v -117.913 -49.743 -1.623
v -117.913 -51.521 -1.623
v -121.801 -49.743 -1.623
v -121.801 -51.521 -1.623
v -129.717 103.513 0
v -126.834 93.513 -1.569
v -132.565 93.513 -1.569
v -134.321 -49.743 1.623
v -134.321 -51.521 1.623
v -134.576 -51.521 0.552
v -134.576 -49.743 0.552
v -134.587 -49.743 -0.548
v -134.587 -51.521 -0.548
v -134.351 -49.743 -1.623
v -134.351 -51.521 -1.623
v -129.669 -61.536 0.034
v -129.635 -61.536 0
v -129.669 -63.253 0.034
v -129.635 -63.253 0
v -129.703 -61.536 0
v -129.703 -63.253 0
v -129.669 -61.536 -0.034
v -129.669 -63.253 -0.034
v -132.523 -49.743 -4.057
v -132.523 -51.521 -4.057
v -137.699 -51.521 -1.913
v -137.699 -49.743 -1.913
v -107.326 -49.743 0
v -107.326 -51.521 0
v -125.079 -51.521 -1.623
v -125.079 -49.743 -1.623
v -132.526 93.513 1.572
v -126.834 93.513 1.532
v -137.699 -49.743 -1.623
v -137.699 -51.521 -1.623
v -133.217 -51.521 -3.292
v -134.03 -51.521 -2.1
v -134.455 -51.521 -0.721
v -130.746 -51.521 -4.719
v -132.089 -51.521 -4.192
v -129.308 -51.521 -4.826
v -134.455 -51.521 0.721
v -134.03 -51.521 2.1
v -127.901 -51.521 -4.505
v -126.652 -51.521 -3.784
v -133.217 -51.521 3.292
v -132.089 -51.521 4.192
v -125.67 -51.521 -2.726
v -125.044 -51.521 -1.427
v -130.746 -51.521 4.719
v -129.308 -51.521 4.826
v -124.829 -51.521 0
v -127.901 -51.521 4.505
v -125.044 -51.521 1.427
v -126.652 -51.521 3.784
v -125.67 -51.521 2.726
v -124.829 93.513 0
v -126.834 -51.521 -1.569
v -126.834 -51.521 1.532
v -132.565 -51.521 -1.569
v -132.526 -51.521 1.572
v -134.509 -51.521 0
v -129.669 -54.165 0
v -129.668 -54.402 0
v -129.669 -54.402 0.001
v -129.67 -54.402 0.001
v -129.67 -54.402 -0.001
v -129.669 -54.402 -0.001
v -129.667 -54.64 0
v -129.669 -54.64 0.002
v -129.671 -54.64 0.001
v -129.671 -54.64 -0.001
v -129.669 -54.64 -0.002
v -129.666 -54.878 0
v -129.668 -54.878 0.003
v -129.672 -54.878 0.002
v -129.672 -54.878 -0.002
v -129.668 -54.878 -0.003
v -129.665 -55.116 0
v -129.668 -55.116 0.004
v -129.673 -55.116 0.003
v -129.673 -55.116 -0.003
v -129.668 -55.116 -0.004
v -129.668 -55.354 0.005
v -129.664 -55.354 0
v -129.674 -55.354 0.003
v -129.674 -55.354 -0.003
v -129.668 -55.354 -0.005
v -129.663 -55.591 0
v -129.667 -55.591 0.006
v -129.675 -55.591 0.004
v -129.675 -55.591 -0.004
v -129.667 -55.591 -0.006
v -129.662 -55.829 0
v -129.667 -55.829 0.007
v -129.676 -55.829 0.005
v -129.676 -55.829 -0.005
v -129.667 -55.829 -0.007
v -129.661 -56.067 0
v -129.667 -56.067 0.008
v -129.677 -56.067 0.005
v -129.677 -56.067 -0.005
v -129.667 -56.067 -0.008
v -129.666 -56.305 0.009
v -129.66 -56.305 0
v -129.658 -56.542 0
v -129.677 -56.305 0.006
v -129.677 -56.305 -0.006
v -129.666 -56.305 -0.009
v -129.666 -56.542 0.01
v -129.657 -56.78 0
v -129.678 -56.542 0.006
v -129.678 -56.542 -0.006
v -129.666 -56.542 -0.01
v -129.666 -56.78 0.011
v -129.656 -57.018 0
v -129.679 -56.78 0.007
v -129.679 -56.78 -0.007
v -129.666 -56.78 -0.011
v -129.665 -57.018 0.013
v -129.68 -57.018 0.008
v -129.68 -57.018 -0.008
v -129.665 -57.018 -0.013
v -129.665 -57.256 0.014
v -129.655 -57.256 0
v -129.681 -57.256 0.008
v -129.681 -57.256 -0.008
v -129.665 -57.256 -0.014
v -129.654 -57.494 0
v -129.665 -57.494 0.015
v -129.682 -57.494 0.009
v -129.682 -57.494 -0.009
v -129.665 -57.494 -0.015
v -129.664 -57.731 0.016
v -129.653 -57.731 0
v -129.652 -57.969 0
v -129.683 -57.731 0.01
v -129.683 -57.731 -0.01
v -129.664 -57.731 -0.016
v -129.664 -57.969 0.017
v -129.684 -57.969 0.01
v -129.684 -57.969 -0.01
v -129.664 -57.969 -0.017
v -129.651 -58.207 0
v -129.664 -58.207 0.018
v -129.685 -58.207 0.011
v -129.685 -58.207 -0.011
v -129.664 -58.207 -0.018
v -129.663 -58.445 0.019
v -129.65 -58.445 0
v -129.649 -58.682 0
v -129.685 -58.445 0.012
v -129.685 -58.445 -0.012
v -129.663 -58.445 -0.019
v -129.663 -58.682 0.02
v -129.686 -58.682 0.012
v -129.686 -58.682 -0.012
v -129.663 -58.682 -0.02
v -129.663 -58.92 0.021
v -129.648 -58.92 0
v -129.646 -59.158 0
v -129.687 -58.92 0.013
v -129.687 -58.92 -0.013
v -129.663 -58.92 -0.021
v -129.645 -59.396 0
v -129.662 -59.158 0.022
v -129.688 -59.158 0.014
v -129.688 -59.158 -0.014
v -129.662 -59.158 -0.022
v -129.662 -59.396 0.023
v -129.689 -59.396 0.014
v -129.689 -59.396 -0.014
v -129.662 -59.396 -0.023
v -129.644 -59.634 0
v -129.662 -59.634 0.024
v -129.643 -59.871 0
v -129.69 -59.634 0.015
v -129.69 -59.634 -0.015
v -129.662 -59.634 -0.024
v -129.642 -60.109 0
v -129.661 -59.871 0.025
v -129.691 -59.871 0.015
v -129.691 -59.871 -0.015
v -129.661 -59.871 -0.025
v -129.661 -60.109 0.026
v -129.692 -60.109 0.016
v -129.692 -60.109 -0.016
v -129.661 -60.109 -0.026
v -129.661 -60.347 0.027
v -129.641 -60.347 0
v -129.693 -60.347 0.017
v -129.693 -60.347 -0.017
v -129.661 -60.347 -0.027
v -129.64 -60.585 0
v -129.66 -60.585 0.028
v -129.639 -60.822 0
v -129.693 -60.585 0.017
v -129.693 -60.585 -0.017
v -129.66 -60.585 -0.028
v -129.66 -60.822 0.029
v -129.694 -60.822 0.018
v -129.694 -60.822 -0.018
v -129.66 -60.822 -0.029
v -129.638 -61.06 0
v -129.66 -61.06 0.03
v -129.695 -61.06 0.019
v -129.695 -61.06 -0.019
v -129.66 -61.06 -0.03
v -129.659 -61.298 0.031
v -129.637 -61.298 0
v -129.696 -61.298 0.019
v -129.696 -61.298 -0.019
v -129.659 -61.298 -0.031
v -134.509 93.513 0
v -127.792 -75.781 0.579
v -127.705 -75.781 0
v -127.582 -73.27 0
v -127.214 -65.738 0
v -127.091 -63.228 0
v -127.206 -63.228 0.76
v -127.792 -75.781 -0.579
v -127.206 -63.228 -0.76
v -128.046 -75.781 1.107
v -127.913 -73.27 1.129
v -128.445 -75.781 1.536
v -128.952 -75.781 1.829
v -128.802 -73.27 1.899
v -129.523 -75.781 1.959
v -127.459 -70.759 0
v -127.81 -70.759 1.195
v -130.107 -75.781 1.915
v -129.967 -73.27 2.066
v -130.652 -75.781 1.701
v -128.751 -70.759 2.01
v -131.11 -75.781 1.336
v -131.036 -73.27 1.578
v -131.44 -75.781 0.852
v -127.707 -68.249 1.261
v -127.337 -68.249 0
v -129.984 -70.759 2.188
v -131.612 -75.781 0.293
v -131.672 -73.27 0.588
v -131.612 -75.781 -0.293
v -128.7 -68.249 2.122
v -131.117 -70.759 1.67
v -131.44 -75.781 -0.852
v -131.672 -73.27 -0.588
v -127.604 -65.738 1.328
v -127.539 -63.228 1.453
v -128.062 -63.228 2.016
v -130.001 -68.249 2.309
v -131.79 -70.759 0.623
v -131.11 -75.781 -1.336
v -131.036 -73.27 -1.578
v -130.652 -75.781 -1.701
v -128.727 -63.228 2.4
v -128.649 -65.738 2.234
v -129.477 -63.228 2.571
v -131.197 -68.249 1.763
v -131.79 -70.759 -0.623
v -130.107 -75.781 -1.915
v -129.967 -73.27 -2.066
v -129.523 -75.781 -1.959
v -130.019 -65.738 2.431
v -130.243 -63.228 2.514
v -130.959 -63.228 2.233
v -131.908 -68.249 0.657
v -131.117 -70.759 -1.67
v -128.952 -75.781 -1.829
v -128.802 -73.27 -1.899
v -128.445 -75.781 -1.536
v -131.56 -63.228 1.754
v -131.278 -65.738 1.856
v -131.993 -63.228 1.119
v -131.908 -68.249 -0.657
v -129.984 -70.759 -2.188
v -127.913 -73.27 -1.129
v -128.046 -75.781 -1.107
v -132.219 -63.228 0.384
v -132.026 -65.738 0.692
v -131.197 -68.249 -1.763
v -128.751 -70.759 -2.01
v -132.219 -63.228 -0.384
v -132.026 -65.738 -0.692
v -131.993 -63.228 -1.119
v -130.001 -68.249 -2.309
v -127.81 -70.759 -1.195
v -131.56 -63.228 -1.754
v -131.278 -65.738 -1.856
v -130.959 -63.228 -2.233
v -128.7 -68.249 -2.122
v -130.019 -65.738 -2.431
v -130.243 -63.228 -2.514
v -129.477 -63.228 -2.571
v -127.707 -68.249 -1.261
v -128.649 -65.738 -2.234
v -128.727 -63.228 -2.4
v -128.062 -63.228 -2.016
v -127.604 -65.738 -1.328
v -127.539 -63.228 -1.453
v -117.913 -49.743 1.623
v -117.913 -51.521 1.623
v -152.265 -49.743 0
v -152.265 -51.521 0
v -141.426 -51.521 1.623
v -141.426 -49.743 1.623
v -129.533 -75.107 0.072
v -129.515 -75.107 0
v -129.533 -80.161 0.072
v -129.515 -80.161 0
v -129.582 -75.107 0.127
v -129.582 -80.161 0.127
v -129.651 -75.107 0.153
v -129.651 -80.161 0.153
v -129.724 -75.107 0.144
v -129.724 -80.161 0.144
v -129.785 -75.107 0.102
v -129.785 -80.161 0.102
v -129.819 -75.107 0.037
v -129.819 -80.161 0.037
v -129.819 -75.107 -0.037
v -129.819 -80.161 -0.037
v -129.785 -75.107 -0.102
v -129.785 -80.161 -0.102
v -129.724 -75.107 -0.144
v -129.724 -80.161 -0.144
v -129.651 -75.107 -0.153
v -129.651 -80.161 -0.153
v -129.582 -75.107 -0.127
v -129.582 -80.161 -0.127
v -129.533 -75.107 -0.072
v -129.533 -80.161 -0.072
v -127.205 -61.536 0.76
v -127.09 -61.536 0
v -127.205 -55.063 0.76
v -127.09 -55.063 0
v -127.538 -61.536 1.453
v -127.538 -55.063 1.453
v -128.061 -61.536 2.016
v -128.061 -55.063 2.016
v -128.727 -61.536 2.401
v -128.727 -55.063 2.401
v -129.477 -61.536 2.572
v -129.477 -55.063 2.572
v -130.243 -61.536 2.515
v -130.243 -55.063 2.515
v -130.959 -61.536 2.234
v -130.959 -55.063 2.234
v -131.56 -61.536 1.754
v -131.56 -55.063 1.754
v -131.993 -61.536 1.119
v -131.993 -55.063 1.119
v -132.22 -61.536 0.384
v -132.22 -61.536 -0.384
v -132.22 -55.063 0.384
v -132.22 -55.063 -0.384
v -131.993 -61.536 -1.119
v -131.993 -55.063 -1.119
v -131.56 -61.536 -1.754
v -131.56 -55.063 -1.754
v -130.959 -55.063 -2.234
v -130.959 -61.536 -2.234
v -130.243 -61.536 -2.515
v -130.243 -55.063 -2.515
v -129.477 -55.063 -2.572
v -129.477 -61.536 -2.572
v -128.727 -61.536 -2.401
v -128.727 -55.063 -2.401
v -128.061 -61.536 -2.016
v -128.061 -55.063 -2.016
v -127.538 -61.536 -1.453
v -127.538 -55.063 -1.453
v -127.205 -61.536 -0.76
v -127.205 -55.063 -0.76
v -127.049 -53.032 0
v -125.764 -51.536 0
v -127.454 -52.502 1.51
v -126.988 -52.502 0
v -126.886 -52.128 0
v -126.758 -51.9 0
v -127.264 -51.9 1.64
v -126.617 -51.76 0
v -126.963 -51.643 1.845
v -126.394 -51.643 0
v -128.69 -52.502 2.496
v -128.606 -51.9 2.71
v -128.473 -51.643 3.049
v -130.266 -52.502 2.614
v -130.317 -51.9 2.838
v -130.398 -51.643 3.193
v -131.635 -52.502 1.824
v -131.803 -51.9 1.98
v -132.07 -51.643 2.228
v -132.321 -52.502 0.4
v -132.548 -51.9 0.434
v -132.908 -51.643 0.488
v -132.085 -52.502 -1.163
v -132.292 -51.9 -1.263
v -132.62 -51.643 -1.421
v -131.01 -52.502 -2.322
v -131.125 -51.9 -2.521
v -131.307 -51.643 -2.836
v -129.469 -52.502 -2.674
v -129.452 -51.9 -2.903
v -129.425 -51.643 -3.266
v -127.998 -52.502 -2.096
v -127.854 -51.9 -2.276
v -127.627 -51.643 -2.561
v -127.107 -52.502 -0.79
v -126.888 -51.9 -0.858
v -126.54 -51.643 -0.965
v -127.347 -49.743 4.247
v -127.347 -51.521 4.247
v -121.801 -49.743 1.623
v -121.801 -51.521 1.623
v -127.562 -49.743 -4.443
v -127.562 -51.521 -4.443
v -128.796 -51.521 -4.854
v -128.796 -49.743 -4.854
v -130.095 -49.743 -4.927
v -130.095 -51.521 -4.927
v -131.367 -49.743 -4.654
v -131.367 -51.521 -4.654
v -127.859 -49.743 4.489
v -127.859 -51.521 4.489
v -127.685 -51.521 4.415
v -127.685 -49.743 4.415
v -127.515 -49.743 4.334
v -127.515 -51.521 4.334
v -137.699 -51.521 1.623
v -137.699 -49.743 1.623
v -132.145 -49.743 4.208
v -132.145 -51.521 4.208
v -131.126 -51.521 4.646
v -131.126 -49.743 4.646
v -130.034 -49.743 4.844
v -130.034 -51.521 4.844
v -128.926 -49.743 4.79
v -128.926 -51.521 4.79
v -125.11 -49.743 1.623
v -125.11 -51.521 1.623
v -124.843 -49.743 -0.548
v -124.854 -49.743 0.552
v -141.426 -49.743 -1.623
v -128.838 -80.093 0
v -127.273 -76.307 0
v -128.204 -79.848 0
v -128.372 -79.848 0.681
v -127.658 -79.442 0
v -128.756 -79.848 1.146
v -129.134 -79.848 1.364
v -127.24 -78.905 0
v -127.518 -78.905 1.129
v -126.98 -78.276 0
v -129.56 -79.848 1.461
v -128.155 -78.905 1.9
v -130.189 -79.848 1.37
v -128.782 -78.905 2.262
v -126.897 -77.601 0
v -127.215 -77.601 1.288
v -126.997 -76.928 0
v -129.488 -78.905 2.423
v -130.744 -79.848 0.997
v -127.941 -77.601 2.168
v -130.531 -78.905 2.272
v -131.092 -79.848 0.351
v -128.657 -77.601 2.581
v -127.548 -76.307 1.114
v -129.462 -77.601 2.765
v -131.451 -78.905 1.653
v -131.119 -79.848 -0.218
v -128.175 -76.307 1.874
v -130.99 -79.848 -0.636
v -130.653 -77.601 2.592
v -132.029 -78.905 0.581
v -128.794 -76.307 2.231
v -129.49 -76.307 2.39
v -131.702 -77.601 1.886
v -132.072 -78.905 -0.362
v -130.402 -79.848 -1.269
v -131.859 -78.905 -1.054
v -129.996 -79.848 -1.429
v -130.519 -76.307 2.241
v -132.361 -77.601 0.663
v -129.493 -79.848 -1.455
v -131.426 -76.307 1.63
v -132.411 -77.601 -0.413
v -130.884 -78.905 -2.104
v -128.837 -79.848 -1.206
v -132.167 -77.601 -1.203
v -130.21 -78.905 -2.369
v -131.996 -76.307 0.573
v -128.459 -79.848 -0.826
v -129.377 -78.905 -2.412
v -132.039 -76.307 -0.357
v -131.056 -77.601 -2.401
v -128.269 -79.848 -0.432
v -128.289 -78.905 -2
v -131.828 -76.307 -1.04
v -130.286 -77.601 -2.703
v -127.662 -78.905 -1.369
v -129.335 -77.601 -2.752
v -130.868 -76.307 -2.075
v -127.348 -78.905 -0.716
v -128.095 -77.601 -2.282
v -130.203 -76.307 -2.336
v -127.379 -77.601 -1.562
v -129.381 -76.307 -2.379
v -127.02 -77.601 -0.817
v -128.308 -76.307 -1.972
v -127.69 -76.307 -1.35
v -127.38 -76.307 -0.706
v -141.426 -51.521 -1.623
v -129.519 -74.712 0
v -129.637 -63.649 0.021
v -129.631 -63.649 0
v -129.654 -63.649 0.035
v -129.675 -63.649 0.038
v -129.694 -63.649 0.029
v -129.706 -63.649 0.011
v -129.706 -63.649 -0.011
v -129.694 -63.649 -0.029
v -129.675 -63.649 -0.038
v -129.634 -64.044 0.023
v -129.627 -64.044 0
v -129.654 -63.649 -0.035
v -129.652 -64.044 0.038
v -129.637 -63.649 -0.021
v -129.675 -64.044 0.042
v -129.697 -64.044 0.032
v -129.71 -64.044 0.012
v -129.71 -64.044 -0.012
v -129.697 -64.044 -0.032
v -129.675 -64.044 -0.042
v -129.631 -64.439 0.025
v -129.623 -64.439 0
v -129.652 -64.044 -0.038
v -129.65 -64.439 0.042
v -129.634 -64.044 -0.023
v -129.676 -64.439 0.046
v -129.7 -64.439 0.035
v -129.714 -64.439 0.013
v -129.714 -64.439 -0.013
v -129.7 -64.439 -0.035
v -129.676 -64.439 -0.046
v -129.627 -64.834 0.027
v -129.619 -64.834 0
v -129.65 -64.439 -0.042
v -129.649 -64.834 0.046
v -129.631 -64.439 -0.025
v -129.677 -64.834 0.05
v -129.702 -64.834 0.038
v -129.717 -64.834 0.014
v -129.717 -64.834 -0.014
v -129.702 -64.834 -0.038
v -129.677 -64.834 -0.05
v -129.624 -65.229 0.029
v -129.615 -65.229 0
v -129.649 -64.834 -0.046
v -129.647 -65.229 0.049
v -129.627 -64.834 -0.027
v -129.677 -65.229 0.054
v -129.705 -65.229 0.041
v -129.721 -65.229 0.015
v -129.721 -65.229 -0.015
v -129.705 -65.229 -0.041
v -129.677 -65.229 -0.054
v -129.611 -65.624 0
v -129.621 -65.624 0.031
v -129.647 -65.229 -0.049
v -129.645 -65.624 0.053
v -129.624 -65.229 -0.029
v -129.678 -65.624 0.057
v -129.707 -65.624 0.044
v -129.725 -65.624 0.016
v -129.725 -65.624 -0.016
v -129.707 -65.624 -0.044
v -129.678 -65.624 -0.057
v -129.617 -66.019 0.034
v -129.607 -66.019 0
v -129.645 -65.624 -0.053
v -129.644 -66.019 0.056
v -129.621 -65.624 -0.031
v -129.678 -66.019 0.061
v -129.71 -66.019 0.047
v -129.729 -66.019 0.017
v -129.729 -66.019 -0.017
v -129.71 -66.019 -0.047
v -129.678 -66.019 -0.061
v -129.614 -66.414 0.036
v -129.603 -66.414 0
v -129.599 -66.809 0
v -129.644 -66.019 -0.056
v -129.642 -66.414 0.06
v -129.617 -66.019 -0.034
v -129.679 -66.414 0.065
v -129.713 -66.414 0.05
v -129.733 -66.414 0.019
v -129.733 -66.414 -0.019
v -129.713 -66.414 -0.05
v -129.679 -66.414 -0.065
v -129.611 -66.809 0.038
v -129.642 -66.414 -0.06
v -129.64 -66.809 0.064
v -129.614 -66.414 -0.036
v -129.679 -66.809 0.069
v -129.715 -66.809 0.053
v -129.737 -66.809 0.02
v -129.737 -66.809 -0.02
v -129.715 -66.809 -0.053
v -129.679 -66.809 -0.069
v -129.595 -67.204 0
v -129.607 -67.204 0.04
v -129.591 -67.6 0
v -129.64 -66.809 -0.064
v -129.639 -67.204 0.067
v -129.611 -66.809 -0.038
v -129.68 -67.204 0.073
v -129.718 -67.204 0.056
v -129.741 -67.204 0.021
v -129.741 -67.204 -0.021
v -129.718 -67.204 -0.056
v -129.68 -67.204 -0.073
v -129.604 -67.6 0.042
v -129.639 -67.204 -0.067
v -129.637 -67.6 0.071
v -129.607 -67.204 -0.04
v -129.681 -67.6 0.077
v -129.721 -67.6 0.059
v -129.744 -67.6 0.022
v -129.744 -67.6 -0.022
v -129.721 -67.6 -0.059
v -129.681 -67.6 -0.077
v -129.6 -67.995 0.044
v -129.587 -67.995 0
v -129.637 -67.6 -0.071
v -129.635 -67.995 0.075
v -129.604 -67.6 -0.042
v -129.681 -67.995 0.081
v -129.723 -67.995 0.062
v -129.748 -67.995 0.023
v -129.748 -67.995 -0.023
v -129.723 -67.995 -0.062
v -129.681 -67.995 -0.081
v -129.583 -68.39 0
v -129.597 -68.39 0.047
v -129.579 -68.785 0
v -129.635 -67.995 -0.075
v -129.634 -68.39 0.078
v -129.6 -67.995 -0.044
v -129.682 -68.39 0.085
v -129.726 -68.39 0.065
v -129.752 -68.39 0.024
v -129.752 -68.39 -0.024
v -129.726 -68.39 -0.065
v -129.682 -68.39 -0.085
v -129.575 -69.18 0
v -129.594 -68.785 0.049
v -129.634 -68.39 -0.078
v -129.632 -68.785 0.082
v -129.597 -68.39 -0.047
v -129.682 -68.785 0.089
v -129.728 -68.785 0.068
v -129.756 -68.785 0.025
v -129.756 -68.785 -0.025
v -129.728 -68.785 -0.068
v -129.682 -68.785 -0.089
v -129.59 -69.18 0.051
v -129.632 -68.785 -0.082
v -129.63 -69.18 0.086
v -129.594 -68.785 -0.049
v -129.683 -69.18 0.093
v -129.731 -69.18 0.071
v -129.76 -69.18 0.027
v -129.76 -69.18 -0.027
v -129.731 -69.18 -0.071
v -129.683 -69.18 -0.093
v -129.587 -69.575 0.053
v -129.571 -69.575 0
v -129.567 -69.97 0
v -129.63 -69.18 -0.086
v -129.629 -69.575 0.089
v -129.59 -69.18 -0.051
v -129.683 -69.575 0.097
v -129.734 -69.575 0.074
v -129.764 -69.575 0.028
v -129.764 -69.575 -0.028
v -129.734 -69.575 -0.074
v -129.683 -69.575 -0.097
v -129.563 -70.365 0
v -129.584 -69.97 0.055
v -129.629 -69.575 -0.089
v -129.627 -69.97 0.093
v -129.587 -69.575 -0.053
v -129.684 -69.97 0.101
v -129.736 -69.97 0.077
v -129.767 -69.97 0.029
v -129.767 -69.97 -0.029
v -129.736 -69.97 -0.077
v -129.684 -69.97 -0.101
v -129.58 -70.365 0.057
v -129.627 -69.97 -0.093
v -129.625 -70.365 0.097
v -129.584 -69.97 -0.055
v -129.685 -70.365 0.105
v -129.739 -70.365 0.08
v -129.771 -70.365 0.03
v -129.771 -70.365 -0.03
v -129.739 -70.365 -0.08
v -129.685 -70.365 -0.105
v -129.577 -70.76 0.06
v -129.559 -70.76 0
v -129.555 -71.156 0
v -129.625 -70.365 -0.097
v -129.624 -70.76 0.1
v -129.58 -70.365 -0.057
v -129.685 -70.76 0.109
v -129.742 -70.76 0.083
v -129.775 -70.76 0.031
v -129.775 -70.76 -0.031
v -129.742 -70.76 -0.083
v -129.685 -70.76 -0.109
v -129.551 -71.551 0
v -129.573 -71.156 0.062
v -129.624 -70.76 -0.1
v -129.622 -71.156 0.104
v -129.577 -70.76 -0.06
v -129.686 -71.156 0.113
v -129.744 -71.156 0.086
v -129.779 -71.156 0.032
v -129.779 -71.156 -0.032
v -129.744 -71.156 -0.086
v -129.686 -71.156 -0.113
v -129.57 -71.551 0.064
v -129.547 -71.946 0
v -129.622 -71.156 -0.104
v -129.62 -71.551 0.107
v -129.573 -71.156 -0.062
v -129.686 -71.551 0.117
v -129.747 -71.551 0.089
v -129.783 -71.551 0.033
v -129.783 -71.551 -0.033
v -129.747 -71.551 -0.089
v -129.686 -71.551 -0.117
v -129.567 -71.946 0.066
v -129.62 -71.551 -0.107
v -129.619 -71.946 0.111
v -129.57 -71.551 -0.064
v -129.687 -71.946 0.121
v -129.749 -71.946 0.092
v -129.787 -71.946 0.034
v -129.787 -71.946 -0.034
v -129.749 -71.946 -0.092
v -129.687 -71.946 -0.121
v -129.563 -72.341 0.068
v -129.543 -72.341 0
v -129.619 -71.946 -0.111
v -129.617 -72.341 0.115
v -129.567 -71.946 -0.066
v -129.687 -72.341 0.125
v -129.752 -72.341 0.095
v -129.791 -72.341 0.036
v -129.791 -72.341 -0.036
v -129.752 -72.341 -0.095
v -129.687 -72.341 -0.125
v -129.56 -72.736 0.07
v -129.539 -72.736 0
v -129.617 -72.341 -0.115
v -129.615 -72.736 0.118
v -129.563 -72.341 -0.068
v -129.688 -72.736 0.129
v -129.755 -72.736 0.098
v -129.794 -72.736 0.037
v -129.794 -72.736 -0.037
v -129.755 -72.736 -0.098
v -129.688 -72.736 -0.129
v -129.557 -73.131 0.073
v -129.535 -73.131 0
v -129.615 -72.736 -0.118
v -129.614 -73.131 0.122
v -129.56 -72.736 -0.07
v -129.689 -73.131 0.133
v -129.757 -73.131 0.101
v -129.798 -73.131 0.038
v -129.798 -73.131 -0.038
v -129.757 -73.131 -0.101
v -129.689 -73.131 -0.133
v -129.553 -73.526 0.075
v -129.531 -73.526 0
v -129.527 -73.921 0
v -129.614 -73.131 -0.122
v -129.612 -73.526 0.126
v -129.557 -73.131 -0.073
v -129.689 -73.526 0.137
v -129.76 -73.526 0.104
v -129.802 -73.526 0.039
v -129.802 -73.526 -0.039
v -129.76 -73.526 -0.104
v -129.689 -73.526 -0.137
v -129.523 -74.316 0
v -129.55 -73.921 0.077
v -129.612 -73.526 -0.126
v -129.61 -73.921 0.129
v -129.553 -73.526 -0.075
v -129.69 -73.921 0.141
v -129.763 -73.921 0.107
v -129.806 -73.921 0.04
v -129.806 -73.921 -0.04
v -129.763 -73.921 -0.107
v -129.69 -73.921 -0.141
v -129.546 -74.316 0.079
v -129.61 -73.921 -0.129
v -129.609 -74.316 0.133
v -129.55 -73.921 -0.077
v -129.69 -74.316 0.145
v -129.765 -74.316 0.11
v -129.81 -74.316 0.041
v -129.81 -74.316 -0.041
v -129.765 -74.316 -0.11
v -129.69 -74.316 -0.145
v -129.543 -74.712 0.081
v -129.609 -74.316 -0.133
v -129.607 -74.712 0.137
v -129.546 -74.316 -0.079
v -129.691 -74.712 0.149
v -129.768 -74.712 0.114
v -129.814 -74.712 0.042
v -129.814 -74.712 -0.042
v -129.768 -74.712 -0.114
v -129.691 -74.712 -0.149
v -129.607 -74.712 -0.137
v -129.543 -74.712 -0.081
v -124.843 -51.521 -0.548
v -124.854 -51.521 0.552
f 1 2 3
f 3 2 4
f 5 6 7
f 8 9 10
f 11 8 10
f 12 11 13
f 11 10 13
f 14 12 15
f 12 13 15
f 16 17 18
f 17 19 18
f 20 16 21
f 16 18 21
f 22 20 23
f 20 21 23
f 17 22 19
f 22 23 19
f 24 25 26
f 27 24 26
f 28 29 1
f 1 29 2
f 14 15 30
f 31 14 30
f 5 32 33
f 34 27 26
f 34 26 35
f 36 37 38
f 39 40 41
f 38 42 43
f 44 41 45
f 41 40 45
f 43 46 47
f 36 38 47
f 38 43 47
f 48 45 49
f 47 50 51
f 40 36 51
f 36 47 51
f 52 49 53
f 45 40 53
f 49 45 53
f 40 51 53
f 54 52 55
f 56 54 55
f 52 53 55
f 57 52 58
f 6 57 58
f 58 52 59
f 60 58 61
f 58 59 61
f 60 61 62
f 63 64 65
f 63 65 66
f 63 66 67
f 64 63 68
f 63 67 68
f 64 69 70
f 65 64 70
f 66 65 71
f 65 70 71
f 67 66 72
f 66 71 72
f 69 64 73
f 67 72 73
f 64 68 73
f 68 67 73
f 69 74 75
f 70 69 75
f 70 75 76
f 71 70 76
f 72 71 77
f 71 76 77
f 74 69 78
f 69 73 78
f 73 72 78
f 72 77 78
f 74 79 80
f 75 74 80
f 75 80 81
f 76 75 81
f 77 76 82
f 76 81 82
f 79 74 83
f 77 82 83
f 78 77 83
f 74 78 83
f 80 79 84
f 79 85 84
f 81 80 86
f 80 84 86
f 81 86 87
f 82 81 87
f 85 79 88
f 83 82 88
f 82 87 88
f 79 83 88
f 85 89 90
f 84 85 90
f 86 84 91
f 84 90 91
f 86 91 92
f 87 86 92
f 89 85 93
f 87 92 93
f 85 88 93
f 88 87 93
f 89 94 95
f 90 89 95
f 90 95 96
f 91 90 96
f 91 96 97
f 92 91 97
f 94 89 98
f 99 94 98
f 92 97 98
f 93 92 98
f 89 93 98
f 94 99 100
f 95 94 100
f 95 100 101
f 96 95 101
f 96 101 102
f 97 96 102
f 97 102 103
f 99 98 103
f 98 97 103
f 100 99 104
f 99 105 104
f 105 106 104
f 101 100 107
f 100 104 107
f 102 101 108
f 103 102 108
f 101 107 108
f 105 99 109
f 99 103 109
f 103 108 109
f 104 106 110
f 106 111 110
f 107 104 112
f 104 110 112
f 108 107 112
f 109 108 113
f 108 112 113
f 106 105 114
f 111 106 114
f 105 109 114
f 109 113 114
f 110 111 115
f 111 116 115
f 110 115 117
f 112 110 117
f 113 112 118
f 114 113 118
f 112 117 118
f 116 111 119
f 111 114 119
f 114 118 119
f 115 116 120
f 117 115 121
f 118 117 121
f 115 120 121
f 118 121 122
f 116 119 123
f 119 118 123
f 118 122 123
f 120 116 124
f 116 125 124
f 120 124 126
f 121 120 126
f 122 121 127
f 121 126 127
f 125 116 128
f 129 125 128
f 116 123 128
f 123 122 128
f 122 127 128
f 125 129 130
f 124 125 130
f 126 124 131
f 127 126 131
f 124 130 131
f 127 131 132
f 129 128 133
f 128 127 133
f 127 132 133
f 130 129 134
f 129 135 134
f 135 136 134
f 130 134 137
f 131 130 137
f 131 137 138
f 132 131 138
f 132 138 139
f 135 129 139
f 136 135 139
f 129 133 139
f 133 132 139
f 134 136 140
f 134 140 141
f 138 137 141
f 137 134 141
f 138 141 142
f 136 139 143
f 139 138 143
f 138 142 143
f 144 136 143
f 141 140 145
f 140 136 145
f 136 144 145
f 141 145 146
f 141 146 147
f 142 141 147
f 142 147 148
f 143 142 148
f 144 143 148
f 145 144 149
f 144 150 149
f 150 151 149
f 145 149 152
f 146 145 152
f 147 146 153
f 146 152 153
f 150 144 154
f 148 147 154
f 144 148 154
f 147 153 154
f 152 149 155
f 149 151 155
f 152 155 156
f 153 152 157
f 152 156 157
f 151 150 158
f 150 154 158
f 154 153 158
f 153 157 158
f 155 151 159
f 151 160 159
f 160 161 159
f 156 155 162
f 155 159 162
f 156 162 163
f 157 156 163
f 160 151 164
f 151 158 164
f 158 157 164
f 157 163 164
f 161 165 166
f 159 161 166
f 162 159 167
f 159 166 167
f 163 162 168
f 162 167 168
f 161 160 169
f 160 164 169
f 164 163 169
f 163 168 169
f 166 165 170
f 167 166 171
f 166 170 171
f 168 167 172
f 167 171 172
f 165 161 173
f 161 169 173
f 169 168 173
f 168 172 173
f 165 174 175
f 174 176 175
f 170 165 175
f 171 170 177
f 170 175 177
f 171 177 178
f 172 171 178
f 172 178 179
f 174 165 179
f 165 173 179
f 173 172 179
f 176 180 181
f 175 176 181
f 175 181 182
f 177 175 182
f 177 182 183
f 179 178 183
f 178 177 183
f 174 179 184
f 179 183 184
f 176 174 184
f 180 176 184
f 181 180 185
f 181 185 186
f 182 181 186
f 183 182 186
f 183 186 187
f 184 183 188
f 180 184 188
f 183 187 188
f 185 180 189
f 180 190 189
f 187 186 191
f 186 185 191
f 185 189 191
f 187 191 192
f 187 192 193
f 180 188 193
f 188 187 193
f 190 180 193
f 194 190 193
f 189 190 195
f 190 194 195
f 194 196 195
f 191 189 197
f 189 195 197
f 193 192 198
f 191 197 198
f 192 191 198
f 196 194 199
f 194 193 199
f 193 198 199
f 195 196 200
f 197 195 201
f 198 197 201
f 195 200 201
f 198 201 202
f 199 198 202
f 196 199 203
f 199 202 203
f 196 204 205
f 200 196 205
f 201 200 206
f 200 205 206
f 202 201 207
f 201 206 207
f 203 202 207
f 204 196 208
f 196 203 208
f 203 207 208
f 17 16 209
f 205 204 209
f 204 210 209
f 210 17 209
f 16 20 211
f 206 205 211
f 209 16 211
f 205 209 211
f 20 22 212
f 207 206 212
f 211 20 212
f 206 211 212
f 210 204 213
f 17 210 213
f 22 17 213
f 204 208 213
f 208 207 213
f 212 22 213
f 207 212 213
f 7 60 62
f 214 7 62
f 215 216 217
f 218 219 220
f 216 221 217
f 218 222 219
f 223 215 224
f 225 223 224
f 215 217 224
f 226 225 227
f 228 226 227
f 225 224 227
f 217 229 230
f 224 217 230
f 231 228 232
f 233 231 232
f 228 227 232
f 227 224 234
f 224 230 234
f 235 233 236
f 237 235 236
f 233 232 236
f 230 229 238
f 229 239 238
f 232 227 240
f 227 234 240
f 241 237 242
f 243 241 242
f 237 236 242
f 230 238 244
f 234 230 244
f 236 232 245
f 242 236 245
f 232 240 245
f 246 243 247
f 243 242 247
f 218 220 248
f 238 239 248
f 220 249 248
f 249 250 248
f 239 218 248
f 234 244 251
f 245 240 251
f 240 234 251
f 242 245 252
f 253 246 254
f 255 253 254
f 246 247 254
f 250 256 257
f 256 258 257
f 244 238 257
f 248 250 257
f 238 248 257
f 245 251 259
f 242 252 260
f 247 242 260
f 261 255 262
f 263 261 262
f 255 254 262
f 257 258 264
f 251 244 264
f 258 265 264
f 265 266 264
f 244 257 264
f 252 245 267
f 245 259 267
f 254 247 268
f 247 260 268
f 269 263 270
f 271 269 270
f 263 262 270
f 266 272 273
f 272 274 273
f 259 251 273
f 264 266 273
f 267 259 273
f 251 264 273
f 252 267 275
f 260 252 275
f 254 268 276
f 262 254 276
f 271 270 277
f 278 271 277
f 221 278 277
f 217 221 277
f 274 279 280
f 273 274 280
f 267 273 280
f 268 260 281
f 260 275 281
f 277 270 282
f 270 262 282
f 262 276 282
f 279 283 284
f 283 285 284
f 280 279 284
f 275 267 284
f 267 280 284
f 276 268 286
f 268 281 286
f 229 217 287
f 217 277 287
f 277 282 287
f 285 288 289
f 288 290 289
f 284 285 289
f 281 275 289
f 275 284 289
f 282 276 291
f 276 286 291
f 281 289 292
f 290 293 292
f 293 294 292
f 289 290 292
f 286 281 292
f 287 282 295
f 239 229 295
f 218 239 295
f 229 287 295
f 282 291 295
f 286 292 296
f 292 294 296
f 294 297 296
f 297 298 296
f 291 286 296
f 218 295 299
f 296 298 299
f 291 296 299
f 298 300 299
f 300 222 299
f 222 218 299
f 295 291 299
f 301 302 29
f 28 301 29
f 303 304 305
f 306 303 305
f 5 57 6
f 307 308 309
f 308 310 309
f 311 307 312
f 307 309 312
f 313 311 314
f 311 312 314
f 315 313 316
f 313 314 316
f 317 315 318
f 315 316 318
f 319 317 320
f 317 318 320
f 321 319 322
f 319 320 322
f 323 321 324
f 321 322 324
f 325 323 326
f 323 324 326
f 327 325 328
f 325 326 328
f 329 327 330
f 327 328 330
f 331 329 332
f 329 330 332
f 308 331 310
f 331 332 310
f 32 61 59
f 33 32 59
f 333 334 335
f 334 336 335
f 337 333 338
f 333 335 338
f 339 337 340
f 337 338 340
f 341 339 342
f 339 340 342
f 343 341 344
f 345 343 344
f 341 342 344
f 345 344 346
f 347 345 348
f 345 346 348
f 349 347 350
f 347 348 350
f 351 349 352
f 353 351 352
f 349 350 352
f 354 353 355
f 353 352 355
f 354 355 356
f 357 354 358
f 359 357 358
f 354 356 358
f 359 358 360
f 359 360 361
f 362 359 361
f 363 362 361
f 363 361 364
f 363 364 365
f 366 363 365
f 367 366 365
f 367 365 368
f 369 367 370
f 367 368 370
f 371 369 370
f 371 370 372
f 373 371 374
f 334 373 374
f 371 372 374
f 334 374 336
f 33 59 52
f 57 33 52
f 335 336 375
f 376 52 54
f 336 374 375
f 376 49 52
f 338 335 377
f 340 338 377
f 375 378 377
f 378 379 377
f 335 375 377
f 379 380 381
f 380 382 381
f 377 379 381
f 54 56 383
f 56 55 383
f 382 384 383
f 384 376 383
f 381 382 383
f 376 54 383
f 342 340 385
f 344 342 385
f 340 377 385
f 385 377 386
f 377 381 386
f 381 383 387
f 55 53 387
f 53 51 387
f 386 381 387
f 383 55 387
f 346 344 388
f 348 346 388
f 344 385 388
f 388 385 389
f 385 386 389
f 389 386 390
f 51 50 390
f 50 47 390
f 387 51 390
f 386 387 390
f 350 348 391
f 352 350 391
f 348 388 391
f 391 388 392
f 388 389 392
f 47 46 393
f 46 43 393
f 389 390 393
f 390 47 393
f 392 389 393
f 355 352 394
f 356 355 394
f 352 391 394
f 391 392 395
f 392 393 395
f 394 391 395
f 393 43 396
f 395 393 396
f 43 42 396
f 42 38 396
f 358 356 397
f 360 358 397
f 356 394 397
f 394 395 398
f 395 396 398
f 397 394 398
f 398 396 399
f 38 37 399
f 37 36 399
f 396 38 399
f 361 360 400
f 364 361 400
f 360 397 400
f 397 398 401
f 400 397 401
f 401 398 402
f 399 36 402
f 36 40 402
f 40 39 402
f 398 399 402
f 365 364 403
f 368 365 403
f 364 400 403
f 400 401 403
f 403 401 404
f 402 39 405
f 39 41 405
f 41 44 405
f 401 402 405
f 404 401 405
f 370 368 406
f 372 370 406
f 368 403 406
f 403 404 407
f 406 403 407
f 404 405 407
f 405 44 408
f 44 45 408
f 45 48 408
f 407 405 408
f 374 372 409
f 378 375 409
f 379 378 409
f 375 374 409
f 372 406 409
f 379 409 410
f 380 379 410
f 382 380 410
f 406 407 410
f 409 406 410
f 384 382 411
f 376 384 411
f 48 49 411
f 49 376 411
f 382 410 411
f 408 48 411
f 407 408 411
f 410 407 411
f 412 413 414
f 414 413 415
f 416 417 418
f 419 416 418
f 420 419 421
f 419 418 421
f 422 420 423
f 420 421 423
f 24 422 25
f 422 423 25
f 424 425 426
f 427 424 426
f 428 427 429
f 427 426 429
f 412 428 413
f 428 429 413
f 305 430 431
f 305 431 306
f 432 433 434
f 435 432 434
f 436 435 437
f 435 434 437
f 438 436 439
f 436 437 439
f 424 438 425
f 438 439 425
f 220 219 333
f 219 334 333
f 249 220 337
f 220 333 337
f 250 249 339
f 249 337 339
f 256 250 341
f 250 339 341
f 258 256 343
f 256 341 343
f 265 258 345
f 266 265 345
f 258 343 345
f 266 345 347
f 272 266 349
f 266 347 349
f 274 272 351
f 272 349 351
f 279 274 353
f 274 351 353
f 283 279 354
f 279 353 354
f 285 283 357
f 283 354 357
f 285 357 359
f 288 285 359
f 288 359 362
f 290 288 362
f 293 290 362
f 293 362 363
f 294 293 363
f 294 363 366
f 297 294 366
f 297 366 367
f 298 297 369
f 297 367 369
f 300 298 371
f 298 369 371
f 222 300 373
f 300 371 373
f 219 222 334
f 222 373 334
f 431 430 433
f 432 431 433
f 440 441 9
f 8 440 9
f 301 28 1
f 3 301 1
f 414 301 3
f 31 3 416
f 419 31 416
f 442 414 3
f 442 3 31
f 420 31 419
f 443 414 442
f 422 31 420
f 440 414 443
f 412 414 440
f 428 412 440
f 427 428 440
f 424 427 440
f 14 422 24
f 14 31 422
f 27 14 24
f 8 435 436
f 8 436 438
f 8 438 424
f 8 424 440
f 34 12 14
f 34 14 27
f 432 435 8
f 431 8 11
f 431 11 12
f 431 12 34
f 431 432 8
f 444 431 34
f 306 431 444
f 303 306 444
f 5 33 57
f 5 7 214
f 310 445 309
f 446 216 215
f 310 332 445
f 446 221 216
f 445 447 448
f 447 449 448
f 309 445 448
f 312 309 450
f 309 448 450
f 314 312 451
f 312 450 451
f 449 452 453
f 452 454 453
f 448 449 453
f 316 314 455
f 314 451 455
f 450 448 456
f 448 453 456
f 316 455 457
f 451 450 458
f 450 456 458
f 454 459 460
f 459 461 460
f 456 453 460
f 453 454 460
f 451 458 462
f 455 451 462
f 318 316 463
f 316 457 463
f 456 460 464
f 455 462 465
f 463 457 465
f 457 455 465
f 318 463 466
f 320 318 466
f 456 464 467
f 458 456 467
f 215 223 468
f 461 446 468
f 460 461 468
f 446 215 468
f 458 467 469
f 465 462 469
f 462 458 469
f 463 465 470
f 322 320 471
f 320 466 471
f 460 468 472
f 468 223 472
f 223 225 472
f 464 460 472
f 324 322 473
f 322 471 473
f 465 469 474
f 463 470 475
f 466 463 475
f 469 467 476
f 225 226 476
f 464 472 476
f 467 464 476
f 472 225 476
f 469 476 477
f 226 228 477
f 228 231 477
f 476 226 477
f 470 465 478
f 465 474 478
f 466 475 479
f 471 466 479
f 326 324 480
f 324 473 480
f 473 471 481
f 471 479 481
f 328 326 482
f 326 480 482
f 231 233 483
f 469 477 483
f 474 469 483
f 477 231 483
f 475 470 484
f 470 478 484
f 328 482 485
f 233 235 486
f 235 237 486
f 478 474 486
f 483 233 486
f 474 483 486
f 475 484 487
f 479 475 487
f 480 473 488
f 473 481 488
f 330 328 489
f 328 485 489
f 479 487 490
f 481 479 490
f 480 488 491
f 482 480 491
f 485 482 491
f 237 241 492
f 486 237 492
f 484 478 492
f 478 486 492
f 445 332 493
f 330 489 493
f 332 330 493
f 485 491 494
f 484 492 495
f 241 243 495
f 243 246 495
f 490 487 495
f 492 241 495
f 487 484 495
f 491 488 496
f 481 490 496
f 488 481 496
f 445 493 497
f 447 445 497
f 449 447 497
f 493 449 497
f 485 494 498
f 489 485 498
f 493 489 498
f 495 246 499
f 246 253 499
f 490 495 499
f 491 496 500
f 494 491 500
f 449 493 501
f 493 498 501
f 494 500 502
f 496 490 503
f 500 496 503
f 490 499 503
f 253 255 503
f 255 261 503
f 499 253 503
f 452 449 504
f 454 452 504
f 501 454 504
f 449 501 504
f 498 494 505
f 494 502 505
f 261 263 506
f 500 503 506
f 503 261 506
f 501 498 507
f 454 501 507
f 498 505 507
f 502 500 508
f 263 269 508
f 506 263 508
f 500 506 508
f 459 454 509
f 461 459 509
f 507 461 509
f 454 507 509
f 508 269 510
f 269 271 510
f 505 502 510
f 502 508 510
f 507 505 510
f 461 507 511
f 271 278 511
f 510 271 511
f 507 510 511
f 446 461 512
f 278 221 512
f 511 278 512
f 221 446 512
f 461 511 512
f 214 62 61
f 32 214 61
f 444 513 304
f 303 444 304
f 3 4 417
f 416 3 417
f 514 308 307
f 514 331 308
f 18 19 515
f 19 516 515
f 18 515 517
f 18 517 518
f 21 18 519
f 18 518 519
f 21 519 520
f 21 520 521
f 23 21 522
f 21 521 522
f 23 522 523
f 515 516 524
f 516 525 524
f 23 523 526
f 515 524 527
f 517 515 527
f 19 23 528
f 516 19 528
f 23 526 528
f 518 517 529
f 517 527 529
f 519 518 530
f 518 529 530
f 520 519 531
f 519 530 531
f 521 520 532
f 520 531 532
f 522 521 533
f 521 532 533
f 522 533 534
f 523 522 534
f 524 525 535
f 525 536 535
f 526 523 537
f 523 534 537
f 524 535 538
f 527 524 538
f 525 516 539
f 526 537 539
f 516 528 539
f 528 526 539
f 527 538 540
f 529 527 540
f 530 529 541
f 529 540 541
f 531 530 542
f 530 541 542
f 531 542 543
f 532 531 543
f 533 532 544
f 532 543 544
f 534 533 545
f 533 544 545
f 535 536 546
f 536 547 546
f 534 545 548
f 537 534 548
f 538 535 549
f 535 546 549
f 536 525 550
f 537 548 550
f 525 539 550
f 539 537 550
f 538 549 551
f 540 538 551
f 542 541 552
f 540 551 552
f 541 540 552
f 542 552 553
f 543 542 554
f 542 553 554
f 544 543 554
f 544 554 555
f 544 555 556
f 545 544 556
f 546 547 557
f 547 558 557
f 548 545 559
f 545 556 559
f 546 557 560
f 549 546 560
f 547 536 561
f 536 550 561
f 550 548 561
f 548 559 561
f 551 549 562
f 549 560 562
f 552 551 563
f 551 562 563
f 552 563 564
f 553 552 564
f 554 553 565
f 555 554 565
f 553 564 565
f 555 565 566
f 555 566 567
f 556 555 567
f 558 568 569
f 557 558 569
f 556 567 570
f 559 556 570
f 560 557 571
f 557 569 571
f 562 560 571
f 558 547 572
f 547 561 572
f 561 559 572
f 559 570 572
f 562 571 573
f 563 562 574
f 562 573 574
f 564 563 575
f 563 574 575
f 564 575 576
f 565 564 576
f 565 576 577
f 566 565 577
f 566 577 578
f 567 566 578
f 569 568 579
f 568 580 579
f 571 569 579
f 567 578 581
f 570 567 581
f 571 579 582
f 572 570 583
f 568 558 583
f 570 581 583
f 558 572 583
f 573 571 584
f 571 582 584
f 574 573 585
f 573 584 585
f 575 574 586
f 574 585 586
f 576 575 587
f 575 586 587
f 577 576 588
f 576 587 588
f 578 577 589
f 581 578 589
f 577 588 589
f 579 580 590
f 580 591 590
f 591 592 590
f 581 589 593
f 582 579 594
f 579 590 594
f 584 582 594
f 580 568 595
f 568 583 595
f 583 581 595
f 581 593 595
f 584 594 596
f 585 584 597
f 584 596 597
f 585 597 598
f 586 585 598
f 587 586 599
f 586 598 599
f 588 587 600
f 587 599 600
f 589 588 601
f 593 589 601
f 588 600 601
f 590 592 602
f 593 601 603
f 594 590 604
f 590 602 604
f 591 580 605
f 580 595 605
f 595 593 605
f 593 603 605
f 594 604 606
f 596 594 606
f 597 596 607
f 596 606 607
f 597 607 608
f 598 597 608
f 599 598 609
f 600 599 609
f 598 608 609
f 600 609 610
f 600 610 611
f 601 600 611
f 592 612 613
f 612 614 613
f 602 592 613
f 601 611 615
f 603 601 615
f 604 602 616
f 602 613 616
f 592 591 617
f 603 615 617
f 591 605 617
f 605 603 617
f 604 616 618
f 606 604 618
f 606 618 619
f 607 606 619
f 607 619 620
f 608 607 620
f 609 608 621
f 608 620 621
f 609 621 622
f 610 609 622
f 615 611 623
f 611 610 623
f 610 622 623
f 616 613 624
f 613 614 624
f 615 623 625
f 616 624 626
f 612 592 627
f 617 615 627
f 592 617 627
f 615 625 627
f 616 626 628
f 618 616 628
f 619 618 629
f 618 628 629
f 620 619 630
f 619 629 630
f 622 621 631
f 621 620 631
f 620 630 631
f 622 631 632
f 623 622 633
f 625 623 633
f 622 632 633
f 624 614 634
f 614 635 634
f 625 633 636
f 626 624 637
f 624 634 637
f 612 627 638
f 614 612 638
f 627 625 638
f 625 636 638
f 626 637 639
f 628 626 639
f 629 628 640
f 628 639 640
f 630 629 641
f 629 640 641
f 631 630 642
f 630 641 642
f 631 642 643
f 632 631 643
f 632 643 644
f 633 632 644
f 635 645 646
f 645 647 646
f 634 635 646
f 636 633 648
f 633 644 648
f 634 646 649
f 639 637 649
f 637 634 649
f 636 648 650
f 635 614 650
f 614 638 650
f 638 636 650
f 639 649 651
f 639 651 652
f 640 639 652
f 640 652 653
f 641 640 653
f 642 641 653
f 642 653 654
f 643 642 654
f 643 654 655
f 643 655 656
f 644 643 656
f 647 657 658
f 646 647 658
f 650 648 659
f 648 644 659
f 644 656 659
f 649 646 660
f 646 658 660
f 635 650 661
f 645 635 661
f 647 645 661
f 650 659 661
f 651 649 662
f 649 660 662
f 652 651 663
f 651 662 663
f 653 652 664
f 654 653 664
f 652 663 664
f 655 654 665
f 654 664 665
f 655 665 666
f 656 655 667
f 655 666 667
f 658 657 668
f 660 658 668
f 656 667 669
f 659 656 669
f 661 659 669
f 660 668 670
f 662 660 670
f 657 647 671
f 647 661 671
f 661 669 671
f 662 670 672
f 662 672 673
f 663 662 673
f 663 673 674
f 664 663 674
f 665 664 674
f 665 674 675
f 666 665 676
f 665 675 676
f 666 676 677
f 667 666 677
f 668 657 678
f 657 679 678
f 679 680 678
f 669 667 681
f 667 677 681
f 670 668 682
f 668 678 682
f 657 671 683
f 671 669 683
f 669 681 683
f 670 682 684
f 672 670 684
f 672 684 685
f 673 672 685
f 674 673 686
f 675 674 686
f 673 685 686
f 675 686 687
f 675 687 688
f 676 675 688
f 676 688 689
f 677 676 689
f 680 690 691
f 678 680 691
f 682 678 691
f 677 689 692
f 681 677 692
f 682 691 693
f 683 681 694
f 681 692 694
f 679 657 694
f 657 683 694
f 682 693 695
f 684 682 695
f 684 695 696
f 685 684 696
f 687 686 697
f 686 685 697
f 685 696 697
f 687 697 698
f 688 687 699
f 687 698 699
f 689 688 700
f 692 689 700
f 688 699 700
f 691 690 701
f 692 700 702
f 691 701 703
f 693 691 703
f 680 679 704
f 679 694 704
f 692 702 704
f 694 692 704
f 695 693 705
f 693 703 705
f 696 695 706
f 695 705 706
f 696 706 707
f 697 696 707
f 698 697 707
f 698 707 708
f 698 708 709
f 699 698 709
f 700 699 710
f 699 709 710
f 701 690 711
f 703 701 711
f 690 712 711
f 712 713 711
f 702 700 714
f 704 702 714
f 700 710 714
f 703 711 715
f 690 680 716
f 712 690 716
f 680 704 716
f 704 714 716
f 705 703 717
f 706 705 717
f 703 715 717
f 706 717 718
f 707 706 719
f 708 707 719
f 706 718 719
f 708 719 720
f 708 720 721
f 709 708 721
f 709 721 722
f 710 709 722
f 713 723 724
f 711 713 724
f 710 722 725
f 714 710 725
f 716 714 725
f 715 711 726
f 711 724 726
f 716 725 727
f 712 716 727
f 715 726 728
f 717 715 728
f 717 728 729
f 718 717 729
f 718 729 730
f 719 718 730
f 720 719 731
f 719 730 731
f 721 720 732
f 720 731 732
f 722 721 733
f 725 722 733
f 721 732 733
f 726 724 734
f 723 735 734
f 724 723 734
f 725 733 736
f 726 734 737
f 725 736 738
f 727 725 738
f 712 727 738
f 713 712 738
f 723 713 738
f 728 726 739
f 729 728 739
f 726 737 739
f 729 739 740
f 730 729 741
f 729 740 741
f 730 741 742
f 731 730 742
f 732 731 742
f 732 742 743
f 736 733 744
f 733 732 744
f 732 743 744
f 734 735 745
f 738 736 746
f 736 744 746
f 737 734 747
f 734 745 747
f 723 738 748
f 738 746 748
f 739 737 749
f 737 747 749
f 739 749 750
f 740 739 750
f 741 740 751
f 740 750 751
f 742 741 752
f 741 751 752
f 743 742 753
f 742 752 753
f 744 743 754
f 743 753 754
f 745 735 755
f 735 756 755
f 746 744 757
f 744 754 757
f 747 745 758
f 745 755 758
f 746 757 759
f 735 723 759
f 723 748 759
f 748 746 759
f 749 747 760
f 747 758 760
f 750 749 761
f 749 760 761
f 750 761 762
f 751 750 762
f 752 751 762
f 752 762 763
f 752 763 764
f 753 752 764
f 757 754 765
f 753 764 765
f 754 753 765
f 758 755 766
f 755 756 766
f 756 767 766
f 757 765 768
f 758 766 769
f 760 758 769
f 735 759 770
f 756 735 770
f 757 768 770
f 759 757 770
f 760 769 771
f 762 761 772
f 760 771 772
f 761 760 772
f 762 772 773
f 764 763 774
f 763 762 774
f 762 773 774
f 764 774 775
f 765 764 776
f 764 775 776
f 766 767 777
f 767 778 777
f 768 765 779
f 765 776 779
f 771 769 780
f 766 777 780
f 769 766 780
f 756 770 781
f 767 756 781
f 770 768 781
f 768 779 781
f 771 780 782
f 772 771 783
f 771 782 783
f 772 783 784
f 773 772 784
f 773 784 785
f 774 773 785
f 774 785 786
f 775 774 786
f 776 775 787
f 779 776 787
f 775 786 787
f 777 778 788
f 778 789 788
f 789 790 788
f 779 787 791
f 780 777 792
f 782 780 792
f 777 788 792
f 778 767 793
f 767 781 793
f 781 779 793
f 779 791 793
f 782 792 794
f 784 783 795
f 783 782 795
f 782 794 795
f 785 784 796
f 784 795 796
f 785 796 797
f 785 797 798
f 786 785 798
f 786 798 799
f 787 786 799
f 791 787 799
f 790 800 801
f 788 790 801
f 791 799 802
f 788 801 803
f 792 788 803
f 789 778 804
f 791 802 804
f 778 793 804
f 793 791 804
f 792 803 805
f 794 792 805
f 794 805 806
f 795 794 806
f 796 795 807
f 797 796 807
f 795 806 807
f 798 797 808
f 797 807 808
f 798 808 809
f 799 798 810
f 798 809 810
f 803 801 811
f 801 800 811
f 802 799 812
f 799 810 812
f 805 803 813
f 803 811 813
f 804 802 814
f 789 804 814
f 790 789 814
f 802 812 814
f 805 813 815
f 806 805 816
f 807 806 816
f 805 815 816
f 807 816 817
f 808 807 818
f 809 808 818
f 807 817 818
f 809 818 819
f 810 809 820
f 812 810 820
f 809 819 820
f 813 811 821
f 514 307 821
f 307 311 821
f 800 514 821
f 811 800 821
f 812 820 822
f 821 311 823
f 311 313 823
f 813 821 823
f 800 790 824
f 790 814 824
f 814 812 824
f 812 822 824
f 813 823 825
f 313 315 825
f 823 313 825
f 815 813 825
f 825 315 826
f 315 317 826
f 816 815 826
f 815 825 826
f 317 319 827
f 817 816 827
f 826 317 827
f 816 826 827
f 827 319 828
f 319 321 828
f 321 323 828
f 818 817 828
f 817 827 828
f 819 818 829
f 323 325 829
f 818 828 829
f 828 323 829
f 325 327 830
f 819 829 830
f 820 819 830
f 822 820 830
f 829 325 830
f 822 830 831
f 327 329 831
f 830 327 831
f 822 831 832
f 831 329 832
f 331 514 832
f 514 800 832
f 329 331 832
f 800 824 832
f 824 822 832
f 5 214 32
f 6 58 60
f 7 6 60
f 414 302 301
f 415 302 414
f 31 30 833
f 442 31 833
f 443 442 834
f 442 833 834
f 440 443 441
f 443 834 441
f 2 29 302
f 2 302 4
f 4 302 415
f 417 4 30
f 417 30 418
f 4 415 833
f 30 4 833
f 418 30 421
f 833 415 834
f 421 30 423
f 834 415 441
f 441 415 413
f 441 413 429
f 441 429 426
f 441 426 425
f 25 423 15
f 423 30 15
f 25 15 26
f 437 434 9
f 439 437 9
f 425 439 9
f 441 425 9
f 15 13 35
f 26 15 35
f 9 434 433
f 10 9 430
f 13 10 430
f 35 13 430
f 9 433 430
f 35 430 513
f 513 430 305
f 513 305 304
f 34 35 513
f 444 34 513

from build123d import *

# Parameters (mm, degrees)
F2_W     = 3.7265494466
F2_H     = 3.2452103915
F2_W_2   = 3.8878694177
F3_DEPTH = 1.778
F5_DEPTH = 145.034


with BuildPart() as f1:
    # F0 (on Top) → F1 (revolve)
    with BuildSketch(Plane.XY):
        with BuildLine():
            Line((-127.0902585749, -61.5358054638), (-127.0902585749, -55.0634515109))
            add(Edge.make_bspline(
                [(-129.669457674, -54.1646741331), (-128.2850205898, -54.2526878417), (-127.9523950581, -54.2903457406), (-127.0902585749, -55.0634515109)],
                knots=[0, 0, 0, 0, 2.7313126456, 2.7313126456, 2.7313126456, 2.7313126456], degree=3))
            Line((-129.669457674, -54.1646741331), (-129.635438323, -61.5358054638))
            Line((-129.635438323, -61.5358054638), (-127.0902585749, -61.5358054638))
        make_face()
        with BuildLine():
            add(Edge.make_bspline(
                [(-129.669457674, -54.1646741331), (-128.2850205898, -54.2526878417), (-127.9523950581, -54.2903457406), (-127.0902585749, -55.0634515109)],
                knots=[0, 0, 0, 0, 2.7313126456, 2.7313126456, 2.7313126456, 2.7313126456], degree=3))
            add(Edge.make_bspline(
                [(-127.0902585749, -55.0634515109), (-127.0711956695, -51.5209063888), (-127.0976996838, -51.5209063888), (-124.8294711113, -51.5209063888)],
                knots=[0, 0, 0, 0, 4.2024737832, 4.2024737832, 4.2024737832, 4.2024737832], degree=3))
            Line((-124.8294711113, -51.5209063888), (-129.669457674, -51.5209063888))
            Line((-129.669457674, -51.5209063888), (-129.669457674, -54.1646741331))
        make_face()
        Polygon((-127.0909756422, -63.2276013494), (-127.0902585749, -61.5358054638), (-129.635438323, -61.5358054638), (-129.635438323, -63.25340271), align=None)
        with BuildLine():
            Line((-127.7048313232, -75.7807434323), (-127.0909756422, -63.2276013494))
            Line((-127.0909756422, -63.2276013494), (-129.635438323, -63.25340271))
            Line((-129.635438323, -63.25340271), (-129.5152439055, -75.1066617071))
            ThreePointArc((-129.5152439055, -75.1066617071), (-128.5431259435, -75.263994789), (-127.7048313232, -75.7807434323))
        make_face()
        with BuildLine():
            ThreePointArc((-129.5152439055, -80.1606514156), (-127.0886064754, -78.5995732103), (-127.7048313232, -75.7807434323))
            ThreePointArc((-127.7048313232, -75.7807434323), (-128.5431259435, -75.263994789), (-129.5152439055, -75.1066617071))
            Line((-129.5152439055, -75.1066617071), (-129.5152439055, -80.1606514156))
        make_face()
    revolve(axis=Axis((-129.669457674, -52.8427902609, 0), (0, -1, 0)))


with BuildPart() as f3:
    # F2 (on face) → F3 (new body)
    with BuildSketch(Plane(origin=(0, -51.5209063888, 0), x_dir=(-1, 0, 0), z_dir=(0, 1, 0))):
        with Locations((139.5624317229, 0)):
            Rectangle(F2_W, F2_H)
        Polygon((152.2654891014, 0), (141.4257064462, 1.6226051957), (141.4257064462, -1.6226051957), align=None)
        with BuildLine():
            Line((137.6991569996, -1.6226051957), (137.6991569996, 1.6226051957))
            Line((137.6991569996, 1.6226051957), (134.3205327463, 1.6226051957))
            ThreePointArc((134.3205327463, 1.6226051957), (134.6124994318, 0.0026180172), (134.3512476145, -1.6226051957))
            Line((134.3512476145, -1.6226051957), (137.6991569996, -1.6226051957))
        make_face()
        with BuildLine():
            Line((134.3205327463, 1.6226051957), (137.6991569996, 1.6226051957))
            Line((137.6991569996, 1.6226051957), (132.1454062558, 4.2083863288))
            ThreePointArc((132.1454062558, 4.2083863288), (133.4630258653, 3.1090162755), (134.3205327463, 1.6226051957))
        make_face()
        with BuildLine():
            Line((125.1095648786, 1.6226051957), (134.3205327463, 1.6226051957))
            ThreePointArc((134.3205327463, 1.6226051957), (133.4630258653, 3.1090162755), (132.1454062558, 4.2083863288))
            ThreePointArc((132.1454062558, 4.2083863288), (130.034461551, 4.8435084859), (127.8588082619, 4.4885430413))
            Line((127.8588082619, 4.4885430413), (127.3474626864, 4.2466232709))
            ThreePointArc((127.3474626864, 4.2466232709), (125.9868685604, 3.1407017286), (125.1095648786, 1.6226051957))
        make_face()
        with BuildLine():
            Line((137.6991569996, -1.9126803963), (137.6991569996, -1.6226051957))
            Line((137.6991569996, -1.6226051957), (134.3512476145, -1.6226051957))
            ThreePointArc((134.3512476145, -1.6226051957), (133.6309256802, -2.9853464903), (132.5227364323, -4.0567213621))
            Line((132.5227364323, -4.0567213621), (137.6991569996, -1.9126803963))
        make_face()
        with BuildLine():
            ThreePointArc((125.0788500104, -1.6226051957), (124.8175981931, 0.0026180172), (125.1095648786, 1.6226051957))
            Line((125.1095648786, 1.6226051957), (121.8010783195, 1.6226051957))
            Line((121.8010783195, 1.6226051957), (121.8010783195, -1.6226051957))
            Line((121.8010783195, -1.6226051957), (125.0788500104, -1.6226051957))
        make_face()
        with BuildLine():
            Line((121.8010783195, 1.6226051957), (125.1095648786, 1.6226051957))
            ThreePointArc((125.1095648786, 1.6226051957), (125.9868685604, 3.1407017286), (127.3474626864, 4.2466232709))
            Line((127.3474626864, 4.2466232709), (121.8010783195, 1.6226051957))
        make_face()
        with BuildLine():
            ThreePointArc((132.5227364323, -4.0567213621), (133.6309256802, -2.9853464903), (134.3512476145, -1.6226051957))
            Line((134.3512476145, -1.6226051957), (125.0788500104, -1.6226051957))
            ThreePointArc((125.0788500104, -1.6226051957), (126.0390793221, -3.2801555498), (127.5616517136, -4.442604181))
            ThreePointArc((127.5616517136, -4.442604181), (130.0948519311, -4.9266561038), (132.5227364323, -4.0567213621))
        make_face()
        with BuildLine():
            Line((127.3474626864, 4.2466232709), (127.8588082619, 4.4885430413))
            ThreePointArc((127.8588082619, 4.4885430413), (127.5995980828, 4.3750601367), (127.3474626864, 4.2466232709))
        make_face()
        with Locations((119.8571436107, 0)):
            Rectangle(F2_W_2, F2_H)
        with BuildLine():
            ThreePointArc((127.5616517136, -4.442604181), (126.0390793221, -3.2801555498), (125.0788500104, -1.6226051957))
            Line((125.0788500104, -1.6226051957), (121.8010783195, -1.6226051957))
            Line((121.8010783195, -1.6226051957), (127.5616517136, -4.442604181))
        make_face()
        Polygon((117.9132089019, -1.6226051957), (117.9132089019, 1.6226051957), (107.3257997632, 0), align=None)
    extrude(amount=F3_DEPTH)


with BuildPart() as f5:
    # F4 (on face) → F5 (new body)
    with BuildSketch(Plane(origin=(0, -51.5209063888, 0), x_dir=(-1, 0, 0), z_dir=(0, 1, 0))):
        Polygon((126.8343776464, 1.5322518302), (124.8294711113, 0), (126.8343776464, -1.5685113613), (132.5649023056, -1.5685113613), (134.5094442368, 0), (132.525652647, 1.5715019545), align=None)
    extrude(amount=F5_DEPTH)

    # F5_face (on face) → F9 section 0
    with BuildSketch(Plane(origin=(-129.6889331914, 93.5130936112, -0.00891164), x_dir=(-1, 0, 0), z_dir=(0, 1, 0)), mode=Mode.PRIVATE) as f9_s0:
        Polygon((-2.8545555449, 1.5411634702), (-4.8594620801, 0.00891164), (-2.8545555449, -1.5595997212), (2.8759691142, -1.5595997212), (4.8205110454, 0.00891164), (2.8367194556, 1.5804135945), align=None)
    loft([f9_s0.sketch, Vertex(-129.7173500061, 103.5130936112, 0)])


solid = Compound([f1.part, f3.part, f5.part])
